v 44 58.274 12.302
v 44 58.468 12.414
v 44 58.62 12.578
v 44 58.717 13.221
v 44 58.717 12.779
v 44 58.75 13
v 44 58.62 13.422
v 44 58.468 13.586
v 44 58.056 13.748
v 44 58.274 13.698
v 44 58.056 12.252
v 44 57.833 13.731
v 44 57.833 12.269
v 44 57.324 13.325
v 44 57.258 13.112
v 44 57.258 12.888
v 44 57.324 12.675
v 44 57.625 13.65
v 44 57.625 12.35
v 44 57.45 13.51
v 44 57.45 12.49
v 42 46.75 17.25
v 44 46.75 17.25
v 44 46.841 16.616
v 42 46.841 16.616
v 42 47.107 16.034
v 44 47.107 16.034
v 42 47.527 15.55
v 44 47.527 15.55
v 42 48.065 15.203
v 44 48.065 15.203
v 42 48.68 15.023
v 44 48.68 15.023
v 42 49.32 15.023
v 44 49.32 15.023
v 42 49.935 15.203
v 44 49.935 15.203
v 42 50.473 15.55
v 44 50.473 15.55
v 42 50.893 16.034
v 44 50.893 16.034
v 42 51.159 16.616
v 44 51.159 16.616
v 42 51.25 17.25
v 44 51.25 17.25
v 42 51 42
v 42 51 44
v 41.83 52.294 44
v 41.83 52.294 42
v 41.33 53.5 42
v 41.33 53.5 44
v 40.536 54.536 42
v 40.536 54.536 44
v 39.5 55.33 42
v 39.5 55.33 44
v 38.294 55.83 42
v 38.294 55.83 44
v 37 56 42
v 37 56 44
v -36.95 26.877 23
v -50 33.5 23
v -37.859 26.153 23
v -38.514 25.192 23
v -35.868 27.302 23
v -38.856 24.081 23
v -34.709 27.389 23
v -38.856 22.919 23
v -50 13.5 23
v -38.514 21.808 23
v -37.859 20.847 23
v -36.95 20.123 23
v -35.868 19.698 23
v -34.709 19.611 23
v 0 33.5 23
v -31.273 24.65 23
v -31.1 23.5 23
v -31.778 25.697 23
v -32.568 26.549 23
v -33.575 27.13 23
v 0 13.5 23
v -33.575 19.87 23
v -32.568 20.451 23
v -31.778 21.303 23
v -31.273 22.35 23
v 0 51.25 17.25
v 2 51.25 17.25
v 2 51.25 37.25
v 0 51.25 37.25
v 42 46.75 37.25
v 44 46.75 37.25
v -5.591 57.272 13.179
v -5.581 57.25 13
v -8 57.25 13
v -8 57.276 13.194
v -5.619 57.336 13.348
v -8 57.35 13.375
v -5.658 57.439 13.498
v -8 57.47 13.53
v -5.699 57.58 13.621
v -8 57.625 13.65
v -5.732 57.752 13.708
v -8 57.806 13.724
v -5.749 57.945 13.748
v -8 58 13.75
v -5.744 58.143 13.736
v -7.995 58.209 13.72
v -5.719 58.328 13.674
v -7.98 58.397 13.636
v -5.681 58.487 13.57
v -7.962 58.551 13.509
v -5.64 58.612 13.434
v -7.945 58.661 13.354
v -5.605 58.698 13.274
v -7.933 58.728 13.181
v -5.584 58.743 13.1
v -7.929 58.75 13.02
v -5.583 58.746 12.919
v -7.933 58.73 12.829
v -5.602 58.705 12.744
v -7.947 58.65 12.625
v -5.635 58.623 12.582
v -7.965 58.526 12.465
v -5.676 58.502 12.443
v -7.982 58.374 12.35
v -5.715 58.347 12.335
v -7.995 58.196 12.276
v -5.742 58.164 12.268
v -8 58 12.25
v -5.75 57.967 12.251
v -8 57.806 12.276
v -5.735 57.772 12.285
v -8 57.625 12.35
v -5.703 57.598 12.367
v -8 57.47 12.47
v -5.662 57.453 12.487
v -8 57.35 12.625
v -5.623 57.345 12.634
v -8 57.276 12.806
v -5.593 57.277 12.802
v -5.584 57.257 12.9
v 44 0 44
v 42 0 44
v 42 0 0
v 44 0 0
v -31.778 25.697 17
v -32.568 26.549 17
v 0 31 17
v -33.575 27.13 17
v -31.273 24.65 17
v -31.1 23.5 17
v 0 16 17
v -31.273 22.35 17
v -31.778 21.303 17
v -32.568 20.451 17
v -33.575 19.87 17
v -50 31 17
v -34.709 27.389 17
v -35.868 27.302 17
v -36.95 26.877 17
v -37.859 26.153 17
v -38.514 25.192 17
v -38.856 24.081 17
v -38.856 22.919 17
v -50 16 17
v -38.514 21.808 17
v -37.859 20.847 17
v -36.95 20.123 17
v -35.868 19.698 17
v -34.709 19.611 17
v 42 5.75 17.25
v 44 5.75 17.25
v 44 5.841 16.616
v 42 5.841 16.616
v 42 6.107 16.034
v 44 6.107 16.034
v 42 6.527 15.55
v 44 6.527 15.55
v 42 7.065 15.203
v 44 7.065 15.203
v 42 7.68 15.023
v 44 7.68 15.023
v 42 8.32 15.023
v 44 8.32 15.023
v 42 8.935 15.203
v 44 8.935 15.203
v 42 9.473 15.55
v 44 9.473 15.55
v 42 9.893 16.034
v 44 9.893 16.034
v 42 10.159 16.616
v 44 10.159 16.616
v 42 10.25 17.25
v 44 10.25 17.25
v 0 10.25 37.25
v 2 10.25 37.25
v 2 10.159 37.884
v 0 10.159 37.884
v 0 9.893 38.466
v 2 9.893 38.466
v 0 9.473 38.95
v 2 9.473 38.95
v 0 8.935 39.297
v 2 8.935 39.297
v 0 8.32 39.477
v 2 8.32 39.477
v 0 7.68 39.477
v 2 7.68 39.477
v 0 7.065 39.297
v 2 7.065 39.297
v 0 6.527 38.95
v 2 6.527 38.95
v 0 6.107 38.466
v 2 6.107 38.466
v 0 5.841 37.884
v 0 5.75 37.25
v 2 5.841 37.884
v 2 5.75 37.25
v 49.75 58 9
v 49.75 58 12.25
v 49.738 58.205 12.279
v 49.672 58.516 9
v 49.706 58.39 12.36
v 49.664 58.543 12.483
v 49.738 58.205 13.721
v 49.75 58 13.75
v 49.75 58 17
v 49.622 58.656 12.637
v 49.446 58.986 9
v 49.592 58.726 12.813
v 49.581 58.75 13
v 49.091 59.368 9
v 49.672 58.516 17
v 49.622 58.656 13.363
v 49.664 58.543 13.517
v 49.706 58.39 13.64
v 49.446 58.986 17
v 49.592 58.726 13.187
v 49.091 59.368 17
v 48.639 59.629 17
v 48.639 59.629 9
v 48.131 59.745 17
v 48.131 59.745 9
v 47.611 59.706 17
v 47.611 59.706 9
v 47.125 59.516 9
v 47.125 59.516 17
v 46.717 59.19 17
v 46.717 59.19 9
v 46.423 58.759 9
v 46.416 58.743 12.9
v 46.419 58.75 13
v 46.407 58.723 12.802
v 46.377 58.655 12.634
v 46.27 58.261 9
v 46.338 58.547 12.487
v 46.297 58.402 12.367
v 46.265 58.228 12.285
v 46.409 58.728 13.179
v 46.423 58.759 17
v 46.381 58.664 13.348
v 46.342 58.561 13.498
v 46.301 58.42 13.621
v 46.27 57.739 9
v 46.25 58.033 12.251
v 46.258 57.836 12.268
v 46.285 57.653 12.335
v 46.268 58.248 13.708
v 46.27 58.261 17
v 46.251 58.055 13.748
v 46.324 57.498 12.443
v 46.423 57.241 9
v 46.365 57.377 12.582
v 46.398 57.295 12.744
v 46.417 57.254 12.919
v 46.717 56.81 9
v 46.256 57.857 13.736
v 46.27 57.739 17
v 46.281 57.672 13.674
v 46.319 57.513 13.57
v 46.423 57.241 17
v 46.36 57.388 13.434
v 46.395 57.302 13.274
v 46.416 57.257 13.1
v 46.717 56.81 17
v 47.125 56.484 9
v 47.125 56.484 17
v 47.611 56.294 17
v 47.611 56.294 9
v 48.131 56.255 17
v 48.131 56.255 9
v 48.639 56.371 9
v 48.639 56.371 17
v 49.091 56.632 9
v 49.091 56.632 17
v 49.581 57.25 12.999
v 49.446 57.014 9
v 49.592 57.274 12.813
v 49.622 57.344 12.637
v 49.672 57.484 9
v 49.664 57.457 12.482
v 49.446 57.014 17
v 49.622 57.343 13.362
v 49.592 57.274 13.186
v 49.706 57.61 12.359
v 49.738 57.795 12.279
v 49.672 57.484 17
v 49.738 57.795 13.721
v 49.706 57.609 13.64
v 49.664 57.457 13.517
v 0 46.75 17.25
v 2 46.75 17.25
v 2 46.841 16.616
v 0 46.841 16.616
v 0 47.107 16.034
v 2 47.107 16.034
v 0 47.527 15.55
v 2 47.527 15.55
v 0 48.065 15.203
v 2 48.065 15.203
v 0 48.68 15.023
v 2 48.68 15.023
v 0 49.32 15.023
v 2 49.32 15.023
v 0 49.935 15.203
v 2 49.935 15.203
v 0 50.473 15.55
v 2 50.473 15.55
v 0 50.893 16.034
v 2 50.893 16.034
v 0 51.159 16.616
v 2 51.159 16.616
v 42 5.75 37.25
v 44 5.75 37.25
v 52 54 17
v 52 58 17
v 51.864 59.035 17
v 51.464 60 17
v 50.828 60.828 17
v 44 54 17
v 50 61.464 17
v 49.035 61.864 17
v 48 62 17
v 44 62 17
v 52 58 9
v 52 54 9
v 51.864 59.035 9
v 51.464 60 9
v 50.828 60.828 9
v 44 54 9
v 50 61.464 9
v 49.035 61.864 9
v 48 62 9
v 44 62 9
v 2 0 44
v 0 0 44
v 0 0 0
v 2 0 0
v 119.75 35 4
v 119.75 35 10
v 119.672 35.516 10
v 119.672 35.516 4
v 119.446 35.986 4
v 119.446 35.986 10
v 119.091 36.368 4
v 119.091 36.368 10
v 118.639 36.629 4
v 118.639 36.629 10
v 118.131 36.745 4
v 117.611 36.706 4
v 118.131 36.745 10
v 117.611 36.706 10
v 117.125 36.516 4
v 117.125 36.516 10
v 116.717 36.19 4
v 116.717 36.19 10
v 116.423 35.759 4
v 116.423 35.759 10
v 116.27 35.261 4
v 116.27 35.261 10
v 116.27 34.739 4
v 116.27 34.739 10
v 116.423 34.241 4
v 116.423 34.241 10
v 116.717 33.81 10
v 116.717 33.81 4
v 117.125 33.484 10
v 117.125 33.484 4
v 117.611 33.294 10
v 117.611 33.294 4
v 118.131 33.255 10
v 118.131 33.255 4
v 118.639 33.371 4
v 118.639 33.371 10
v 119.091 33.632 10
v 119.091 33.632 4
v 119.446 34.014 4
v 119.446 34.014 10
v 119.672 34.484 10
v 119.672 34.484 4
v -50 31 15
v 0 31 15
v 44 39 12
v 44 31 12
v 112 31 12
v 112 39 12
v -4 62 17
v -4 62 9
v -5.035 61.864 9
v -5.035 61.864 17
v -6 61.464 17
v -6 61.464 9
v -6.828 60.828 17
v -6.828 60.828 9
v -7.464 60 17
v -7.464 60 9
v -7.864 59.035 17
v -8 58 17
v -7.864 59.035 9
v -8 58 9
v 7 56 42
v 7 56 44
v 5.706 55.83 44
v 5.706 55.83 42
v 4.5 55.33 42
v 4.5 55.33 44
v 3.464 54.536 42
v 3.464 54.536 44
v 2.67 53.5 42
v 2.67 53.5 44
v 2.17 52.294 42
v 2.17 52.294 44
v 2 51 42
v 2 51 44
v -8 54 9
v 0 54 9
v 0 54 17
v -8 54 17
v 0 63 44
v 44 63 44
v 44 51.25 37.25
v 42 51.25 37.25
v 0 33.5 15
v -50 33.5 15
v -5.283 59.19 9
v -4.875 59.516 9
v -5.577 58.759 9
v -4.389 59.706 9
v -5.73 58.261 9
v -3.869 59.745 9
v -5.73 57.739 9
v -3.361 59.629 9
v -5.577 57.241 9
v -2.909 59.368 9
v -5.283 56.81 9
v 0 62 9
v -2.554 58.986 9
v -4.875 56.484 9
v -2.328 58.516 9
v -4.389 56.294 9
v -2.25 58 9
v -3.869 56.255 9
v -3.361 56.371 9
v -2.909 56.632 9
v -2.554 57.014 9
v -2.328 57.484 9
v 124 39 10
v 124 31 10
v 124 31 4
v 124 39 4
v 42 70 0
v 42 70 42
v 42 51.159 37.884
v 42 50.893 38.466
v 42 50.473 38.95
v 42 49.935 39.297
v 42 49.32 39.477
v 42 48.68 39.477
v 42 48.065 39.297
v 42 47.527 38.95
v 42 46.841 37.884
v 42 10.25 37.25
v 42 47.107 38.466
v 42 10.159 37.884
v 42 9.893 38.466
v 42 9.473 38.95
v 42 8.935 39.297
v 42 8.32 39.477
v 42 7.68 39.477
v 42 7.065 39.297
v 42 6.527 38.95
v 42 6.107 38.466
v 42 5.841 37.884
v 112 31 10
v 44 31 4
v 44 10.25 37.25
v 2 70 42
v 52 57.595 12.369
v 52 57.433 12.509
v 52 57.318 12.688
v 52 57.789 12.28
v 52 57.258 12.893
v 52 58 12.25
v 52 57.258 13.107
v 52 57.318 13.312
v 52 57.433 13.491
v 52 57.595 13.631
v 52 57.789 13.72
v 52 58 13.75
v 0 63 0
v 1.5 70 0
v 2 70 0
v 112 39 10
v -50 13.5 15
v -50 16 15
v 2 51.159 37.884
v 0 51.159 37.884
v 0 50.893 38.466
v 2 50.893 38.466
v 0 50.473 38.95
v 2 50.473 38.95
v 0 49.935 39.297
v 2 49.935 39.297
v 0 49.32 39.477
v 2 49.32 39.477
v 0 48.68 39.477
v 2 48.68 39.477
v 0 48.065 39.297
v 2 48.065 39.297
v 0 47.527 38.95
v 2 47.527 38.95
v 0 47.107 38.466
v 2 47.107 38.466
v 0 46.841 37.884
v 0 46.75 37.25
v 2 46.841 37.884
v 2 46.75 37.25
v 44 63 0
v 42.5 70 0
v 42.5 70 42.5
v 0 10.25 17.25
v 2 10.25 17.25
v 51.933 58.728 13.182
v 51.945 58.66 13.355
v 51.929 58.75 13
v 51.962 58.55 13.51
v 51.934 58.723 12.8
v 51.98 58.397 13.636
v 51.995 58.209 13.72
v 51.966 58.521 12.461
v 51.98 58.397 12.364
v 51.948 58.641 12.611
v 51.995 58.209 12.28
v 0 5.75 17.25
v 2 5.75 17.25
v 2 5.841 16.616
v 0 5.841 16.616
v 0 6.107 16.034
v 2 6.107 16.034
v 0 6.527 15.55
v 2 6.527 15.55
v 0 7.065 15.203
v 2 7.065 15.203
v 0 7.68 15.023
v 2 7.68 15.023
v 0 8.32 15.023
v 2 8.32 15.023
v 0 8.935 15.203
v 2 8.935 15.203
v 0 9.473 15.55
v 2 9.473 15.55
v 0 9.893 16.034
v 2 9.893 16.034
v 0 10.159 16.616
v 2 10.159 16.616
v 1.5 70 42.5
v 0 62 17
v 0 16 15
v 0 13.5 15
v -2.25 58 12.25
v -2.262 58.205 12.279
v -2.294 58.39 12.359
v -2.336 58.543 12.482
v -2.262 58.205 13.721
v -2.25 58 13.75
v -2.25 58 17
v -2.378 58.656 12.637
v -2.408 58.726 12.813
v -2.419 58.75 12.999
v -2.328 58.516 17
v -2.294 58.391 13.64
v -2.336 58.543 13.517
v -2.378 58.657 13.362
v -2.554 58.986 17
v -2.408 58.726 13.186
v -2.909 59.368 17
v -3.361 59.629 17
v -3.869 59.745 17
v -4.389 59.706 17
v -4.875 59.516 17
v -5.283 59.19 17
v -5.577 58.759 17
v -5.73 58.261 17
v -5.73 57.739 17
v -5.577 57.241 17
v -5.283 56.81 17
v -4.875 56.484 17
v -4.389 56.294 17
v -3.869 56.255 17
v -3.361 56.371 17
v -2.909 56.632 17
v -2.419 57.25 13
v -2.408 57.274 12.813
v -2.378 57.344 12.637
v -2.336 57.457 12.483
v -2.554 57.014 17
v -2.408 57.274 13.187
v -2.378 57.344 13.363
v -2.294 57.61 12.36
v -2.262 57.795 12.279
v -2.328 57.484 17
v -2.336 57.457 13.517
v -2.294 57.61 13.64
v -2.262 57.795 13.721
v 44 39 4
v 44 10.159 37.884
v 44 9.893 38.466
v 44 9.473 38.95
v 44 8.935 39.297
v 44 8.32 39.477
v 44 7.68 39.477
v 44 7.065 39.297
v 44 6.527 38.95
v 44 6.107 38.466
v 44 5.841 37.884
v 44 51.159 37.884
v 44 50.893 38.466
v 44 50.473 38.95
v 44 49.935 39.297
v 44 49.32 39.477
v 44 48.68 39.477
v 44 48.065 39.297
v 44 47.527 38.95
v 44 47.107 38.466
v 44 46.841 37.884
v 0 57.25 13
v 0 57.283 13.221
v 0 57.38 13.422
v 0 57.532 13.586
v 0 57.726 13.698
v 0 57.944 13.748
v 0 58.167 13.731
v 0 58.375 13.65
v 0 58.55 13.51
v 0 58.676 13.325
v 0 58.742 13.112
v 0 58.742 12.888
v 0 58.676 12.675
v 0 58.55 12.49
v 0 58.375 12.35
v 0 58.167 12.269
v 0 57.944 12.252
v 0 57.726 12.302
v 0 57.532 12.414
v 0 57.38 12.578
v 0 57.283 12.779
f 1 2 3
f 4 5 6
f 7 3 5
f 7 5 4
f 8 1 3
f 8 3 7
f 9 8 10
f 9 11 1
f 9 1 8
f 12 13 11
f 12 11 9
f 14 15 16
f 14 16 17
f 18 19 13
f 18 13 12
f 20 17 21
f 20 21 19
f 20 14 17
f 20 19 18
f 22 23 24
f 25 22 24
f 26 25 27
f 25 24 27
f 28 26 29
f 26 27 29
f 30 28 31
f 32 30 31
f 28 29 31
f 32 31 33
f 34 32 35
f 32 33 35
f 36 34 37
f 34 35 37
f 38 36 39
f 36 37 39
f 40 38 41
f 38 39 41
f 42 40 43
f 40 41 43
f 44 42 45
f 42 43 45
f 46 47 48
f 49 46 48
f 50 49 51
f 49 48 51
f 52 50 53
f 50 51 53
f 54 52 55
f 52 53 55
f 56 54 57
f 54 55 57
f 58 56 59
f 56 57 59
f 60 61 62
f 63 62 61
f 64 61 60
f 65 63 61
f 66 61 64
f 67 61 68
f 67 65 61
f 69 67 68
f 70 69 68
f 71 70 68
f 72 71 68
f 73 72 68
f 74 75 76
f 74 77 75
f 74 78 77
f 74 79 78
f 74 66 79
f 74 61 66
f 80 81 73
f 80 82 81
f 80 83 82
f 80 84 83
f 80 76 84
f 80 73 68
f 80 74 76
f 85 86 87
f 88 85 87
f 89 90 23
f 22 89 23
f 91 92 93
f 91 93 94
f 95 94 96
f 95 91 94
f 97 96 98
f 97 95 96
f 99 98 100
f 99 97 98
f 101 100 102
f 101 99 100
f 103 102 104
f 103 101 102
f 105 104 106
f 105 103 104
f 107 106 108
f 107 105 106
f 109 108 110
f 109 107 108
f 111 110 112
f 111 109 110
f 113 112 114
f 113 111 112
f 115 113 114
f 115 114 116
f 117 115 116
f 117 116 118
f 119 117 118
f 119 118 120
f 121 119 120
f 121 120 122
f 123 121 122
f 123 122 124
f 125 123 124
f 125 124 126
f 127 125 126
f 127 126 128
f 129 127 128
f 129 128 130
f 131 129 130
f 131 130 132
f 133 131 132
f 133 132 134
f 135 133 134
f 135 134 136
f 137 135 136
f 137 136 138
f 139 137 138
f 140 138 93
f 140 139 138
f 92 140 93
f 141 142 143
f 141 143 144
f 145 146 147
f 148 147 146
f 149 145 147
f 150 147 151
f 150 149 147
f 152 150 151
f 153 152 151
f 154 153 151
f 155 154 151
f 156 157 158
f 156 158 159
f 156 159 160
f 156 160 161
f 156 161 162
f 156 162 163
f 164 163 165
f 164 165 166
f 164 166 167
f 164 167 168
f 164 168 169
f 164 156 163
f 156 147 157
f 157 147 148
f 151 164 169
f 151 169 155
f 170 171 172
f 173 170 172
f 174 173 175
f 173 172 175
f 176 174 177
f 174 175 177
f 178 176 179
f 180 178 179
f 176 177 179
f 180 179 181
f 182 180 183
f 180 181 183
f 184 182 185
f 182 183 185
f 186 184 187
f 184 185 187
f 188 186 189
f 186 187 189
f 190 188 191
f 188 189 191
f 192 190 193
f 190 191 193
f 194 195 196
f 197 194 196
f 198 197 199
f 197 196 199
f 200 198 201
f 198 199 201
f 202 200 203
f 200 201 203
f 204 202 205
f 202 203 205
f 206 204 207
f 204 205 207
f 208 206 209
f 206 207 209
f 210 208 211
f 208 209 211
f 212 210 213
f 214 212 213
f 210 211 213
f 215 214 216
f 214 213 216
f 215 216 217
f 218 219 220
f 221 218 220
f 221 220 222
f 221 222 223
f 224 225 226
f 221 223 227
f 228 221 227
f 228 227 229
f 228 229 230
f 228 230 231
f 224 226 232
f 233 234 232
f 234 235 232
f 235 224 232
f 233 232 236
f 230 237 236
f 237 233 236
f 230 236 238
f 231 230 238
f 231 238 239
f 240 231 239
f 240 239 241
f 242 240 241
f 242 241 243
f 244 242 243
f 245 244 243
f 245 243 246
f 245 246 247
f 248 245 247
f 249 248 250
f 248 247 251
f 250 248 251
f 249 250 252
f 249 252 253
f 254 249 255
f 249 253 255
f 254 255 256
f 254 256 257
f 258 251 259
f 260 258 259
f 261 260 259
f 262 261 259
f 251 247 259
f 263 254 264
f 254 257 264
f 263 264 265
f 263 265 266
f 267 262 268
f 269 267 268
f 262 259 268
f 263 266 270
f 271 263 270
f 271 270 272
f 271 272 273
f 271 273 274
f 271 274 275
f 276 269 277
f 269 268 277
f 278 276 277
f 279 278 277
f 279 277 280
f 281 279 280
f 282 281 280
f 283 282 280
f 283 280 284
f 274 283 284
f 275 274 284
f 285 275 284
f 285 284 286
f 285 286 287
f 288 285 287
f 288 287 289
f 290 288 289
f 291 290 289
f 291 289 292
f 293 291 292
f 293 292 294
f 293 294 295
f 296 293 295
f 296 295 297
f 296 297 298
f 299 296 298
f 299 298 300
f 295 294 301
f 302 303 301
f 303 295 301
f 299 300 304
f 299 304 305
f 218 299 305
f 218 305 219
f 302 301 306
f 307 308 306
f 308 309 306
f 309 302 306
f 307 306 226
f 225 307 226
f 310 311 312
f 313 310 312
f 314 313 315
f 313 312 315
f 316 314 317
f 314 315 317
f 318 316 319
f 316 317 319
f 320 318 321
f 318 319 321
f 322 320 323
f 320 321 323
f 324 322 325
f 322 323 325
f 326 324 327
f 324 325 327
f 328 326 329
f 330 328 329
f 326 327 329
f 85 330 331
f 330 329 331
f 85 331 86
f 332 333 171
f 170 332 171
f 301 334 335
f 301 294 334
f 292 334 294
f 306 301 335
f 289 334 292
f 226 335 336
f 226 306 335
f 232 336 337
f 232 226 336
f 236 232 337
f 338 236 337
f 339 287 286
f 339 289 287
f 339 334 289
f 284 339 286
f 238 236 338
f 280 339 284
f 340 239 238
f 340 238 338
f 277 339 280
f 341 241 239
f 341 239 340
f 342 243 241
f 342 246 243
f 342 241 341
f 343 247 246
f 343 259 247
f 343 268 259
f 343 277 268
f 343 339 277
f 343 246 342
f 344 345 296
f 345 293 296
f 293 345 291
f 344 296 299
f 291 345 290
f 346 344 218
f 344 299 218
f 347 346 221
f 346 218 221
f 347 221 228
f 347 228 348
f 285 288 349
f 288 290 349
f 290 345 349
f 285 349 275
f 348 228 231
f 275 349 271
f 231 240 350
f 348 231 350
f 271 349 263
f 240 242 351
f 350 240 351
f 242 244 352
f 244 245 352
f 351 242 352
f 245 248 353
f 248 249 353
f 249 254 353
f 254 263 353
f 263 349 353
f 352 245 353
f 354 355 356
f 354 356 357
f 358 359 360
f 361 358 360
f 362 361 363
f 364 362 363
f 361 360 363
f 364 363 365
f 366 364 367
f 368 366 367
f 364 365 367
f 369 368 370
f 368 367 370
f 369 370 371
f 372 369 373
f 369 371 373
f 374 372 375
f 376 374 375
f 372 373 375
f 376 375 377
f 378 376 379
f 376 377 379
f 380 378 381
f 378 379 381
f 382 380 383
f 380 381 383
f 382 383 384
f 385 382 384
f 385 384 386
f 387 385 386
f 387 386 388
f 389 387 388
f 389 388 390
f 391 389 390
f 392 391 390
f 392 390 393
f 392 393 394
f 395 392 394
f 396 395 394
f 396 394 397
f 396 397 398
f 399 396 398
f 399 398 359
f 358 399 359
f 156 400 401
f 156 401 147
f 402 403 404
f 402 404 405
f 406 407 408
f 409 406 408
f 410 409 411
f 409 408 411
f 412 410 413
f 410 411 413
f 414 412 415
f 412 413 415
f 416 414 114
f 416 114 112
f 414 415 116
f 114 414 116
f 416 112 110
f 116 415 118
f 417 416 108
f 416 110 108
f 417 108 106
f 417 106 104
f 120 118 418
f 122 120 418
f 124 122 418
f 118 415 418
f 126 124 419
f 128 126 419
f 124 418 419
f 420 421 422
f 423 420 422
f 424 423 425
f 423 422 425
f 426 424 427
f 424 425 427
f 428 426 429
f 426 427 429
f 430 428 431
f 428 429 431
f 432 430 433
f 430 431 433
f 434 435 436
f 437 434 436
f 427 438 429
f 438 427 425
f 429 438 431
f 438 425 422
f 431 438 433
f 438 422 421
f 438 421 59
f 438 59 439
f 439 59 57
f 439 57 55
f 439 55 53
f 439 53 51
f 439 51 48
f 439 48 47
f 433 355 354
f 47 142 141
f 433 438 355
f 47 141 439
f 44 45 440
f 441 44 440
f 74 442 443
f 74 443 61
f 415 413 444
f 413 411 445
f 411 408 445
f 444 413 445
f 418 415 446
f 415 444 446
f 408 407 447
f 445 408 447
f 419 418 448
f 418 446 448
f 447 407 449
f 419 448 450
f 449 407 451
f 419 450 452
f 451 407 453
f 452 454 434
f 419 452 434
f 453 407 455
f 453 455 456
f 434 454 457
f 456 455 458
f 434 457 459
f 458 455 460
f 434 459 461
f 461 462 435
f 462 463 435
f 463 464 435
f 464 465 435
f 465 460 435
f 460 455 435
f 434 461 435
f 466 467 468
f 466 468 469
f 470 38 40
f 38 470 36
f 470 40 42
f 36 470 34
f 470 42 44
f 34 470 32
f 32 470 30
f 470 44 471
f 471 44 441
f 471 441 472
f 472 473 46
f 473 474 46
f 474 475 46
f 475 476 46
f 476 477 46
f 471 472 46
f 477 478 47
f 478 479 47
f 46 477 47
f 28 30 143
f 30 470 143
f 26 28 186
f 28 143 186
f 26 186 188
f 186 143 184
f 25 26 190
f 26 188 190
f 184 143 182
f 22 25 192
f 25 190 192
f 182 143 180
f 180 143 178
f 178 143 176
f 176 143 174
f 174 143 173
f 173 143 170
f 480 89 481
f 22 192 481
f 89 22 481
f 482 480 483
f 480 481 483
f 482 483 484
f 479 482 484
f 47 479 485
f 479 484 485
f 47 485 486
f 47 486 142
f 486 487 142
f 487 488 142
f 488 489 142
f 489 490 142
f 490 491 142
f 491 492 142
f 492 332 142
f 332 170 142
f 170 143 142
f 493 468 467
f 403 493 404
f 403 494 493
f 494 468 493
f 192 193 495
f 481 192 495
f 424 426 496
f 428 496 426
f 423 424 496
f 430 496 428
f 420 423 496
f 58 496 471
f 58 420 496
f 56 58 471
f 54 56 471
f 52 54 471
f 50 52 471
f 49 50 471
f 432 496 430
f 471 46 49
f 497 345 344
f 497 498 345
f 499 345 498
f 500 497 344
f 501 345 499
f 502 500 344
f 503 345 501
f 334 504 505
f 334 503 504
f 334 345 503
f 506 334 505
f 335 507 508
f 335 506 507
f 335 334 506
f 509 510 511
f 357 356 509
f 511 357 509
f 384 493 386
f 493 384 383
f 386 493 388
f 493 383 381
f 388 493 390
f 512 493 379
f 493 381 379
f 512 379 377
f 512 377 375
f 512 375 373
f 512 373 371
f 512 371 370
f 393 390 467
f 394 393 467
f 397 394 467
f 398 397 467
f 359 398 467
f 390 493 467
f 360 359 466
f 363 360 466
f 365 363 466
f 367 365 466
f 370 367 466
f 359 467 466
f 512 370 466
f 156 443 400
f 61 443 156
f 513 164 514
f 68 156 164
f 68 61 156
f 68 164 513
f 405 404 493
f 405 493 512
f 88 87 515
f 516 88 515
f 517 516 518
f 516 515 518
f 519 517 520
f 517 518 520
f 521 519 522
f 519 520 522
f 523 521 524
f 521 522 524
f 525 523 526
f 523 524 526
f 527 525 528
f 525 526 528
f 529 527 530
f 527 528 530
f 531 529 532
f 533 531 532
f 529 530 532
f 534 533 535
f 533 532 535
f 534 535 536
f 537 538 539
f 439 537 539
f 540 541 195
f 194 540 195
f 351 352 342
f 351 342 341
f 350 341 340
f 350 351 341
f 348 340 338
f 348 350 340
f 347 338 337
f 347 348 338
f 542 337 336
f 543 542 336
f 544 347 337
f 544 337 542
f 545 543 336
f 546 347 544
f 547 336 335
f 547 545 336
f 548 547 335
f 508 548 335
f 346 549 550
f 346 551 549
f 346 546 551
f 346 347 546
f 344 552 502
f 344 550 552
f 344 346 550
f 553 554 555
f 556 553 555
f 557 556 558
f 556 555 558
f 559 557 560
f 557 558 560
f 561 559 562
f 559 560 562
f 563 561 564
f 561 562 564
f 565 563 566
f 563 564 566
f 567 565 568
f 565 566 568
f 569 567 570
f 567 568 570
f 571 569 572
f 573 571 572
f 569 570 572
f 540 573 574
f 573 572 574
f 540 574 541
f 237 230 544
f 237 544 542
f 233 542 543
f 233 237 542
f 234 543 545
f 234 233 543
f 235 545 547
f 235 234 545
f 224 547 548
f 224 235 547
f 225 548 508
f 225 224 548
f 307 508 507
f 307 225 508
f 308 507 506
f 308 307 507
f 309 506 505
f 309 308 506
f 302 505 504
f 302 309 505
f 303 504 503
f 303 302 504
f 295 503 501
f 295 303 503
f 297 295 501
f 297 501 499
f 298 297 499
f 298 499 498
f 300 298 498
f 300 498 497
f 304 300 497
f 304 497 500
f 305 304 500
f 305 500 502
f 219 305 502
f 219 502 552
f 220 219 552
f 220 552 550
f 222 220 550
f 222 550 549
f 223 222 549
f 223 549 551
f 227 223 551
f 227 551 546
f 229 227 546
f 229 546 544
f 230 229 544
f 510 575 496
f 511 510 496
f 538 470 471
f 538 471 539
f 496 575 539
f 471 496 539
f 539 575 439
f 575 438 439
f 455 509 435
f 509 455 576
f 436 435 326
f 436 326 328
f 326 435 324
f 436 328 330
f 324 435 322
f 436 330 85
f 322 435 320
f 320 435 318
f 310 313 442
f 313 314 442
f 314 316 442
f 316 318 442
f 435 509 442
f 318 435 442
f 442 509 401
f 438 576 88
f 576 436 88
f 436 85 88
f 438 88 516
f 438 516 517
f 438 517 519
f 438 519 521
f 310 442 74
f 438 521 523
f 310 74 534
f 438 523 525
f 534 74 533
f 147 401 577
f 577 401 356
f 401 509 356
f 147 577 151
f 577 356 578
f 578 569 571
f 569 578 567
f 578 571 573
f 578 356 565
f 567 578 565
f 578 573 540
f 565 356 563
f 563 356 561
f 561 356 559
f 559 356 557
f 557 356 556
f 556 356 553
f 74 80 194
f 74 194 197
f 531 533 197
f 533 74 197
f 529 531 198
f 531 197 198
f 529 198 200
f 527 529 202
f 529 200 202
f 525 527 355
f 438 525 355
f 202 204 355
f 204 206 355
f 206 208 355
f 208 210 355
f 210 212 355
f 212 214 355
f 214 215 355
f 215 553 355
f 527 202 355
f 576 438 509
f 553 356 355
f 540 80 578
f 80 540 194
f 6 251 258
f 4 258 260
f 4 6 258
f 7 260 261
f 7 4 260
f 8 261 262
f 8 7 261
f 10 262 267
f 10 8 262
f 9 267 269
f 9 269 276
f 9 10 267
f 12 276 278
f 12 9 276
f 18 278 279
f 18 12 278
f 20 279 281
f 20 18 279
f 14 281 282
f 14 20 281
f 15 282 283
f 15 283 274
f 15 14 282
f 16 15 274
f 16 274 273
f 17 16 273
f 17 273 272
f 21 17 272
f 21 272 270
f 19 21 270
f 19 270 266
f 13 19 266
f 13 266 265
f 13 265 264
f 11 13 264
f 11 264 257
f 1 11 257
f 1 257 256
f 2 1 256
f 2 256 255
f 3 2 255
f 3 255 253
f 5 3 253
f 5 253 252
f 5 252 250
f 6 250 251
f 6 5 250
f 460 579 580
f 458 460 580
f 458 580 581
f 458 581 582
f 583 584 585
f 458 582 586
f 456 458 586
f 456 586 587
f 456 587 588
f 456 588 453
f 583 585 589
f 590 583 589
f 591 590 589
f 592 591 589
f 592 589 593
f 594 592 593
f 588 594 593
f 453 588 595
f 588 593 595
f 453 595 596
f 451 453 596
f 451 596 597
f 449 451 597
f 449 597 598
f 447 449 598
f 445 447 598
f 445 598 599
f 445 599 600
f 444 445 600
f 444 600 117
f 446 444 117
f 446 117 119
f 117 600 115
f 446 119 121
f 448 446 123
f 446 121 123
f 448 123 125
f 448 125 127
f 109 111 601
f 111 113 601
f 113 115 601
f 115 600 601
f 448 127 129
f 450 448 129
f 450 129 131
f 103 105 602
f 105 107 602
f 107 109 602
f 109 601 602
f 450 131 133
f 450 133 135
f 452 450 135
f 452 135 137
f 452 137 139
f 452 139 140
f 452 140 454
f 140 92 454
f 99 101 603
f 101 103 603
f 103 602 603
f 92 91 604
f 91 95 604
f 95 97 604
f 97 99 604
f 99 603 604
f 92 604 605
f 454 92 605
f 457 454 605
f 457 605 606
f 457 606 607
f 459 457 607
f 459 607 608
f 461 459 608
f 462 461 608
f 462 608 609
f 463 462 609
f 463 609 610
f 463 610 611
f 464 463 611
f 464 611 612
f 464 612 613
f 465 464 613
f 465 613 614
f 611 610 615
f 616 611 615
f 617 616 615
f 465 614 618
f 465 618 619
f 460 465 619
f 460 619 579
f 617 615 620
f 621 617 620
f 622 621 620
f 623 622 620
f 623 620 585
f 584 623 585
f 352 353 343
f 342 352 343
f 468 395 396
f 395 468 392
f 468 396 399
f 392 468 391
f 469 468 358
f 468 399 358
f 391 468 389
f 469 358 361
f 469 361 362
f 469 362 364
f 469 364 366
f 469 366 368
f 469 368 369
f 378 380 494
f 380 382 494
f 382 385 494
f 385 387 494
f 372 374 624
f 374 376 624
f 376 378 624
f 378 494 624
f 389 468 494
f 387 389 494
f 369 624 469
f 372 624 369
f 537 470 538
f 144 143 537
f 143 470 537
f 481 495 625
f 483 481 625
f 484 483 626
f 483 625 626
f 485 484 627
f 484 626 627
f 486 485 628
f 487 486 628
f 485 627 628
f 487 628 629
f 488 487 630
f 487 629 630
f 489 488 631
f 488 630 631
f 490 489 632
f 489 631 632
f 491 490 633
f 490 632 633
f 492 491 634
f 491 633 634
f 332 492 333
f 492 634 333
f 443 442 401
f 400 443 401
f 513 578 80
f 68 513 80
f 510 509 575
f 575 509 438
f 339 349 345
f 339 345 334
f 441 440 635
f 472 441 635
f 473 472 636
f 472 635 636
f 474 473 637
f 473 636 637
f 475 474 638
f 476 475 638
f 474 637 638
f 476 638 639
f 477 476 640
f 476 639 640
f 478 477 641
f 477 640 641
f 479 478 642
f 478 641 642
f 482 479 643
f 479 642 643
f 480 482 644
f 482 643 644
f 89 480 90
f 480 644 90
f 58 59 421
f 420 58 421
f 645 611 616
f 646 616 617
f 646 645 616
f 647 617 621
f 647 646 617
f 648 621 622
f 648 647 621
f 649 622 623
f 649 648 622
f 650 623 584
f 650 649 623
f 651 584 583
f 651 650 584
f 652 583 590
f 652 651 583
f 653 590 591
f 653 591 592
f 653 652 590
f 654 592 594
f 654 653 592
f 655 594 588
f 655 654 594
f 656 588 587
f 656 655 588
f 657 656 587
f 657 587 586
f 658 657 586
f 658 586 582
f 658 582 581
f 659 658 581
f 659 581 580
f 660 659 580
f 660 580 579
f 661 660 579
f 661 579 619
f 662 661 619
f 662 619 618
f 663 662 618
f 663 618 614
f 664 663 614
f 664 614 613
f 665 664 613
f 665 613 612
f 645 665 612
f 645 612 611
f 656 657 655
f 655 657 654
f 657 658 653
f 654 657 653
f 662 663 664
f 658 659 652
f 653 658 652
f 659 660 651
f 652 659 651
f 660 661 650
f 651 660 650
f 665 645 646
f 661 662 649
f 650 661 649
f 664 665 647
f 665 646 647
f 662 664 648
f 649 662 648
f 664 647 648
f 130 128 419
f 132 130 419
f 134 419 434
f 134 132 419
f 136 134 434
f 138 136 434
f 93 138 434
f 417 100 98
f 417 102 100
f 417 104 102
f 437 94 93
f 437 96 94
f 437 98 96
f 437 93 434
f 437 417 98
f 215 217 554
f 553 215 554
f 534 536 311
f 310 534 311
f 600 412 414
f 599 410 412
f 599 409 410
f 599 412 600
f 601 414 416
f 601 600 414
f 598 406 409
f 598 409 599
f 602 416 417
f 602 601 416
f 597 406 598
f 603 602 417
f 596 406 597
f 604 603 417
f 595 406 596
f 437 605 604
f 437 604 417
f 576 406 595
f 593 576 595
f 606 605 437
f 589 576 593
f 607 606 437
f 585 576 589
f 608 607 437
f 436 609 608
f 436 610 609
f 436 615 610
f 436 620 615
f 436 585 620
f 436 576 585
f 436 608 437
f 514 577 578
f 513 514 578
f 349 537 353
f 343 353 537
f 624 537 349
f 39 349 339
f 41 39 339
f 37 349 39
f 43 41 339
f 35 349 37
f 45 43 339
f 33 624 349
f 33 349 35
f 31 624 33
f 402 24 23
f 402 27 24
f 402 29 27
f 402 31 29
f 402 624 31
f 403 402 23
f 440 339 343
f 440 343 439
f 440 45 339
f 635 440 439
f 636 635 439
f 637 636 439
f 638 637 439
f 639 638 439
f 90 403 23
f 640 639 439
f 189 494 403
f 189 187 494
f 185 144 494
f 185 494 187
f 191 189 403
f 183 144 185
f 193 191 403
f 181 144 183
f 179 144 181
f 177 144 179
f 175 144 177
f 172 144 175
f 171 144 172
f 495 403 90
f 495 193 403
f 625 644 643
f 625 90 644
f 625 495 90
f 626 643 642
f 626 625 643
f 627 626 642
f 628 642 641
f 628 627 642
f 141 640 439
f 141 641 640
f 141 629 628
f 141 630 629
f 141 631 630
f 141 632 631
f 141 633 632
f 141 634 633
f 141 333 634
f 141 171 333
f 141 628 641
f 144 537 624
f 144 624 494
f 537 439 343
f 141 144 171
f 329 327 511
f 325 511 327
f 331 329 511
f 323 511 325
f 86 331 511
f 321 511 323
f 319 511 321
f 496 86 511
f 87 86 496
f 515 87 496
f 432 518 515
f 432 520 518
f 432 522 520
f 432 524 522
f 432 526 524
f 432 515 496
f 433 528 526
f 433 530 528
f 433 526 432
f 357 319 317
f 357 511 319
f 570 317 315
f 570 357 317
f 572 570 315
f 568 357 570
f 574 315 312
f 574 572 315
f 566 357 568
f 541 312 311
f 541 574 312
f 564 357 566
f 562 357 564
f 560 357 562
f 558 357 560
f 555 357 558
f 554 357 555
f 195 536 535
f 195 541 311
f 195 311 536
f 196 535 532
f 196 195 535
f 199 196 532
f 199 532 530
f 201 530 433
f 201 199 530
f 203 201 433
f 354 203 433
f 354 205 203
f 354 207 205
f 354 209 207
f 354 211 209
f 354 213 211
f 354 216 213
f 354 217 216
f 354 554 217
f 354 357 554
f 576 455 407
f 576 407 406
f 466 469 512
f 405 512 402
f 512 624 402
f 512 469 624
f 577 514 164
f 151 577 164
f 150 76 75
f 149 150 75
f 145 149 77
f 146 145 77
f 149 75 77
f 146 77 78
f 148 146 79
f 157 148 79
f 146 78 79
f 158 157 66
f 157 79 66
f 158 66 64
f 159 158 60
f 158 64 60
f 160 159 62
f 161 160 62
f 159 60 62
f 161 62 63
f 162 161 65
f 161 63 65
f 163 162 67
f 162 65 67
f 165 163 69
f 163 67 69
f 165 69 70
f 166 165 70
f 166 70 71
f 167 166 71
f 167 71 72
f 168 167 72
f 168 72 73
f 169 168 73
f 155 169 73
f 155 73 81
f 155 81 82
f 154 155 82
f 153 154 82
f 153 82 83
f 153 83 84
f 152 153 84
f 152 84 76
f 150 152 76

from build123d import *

# Parameters (mm, degrees)
F0_W         = 44
F0_H         = 44
F1_DEPTH     = 70
F2_W         = 40
F2_H         = 42
F3_DEPTH     = 70
F5_DEPTH     = 44
F7_DEPTH     = 2
F9_W         = 8
F9_H         = 8
F10_DEPTH    = 80
F11_W        = 8
F11_H        = 2
F12_DEPTH    = 12
F13_W        = 20
F13_H        = 8
F14_DEPTH    = 50
F15_W        = 15
F15_H        = 2
F16_DEPTH    = 50
F17_R        = 3.9
F18_DEPTH    = 20
F19_SIZE2    = 1.5
F19_SIZE     = 7
F20_SIZE2    = 7
F20_SIZE     = 1.5
F21_SIZE2    = 7
F21_SIZE     = 1.5
F22_R        = 1.75
F23_DEPTH    = 8
F24_DEPTH    = 44
F25_W        = 8
F25_H        = 8
F25_R        = 0.75
F26_DEPTH    = 8
F27_R        = 1.75
F28_DEPTH    = 8
F29_T1_DEPTH = 28
F30_W        = 8
F30_H        = 8
F30_R        = 0.75
F31_DEPTH    = 8
F32_R        = 1.75
F33_DEPTH    = 8
F34_T1_DEPTH = 28


# Not quite as in the source:
# - a fillet or chamfer that OpenCascade refuses, or shapes differently, is made with other operations: its cross-section is extruded or revolved along the edge and cut away or added


with BuildPart() as f1:
    # F0 (on Front) → F1 (new body)
    with BuildSketch(Plane.XZ):
        with Locations((22, 22)):
            Rectangle(F0_W, F0_H)
    extrude(amount=-F1_DEPTH)

    # F2 (on face) → F3 (cut, through all)
    with BuildSketch(Plane.XZ):
        with Locations((22, 21)):
            Rectangle(F2_W, F2_H)
    extrude(amount=-F3_DEPTH, mode=Mode.SUBTRACT)

    # F4 (on face) → F5 (cut)
    with BuildSketch(Plane.YZ.offset(44)):
        with BuildLine():
            ThreePointArc((51.25, 37.25), (49, 39.5), (46.75, 37.25))
            Line((46.75, 37.25), (46.75, 17.25))
            ThreePointArc((46.75, 17.25), (49, 15), (51.25, 17.25))
            Line((51.25, 17.25), (51.25, 37.25))
        make_face()
    extrude(amount=-F5_DEPTH, mode=Mode.SUBTRACT)

    # F6 (on face) → F7 (cut, through all)
    with BuildSketch(Plane.XY.offset(44)):
        with BuildLine():
            Line((2, 51), (2, 0))
            Line((2, 0), (42, 0))
            Line((42, 0), (42, 51))
            ThreePointArc((42, 51), (40.5355339059, 54.5355339059), (37, 56))
            Line((37, 56), (7, 56))
            ThreePointArc((7, 56), (3.4644660941, 54.5355339059), (2, 51))
        make_face()
    extrude(amount=-F7_DEPTH, mode=Mode.SUBTRACT)

    # F9 (on face) → F10 (join)
    with BuildSketch(Plane.YZ.offset(44)):
        with Locations((35, 8)):
            Rectangle(F9_W, F9_H)
    extrude(amount=F10_DEPTH)

    # F11 (on face) → F12 (cut)
    with BuildSketch(Plane.YZ.offset(124)):
        with Locations((35, 11)):
            Rectangle(F11_W, F11_H)
    extrude(amount=-F12_DEPTH, mode=Mode.SUBTRACT)

    # F13 (on face) → F14 (join)
    with BuildSketch(Plane(origin=(0, 0, 0), x_dir=(0, -1, 0), z_dir=(-1, 0, 0))):
        with Locations((-23.5, 19)):
            Rectangle(F13_W, F13_H)
    extrude(amount=F14_DEPTH)

    # F15 (on face) → F16 (cut, through all)
    with BuildSketch(Plane(origin=(-50, 0, 0), x_dir=(0, -1, 0), z_dir=(-1, 0, 0))):
        with Locations((-23.5, 16)):
            Rectangle(F15_W, F15_H)
    extrude(amount=-F16_DEPTH, mode=Mode.SUBTRACT)

    # F17 (on face) → F18 (cut)
    with BuildSketch(Plane.XY.offset(23)):
        with Locations((-35, 23.5)):
            Circle(F17_R)
    extrude(amount=-F18_DEPTH, mode=Mode.SUBTRACT)

    # F19
    f19_edges = [f1.edges().sort_by_distance(p)[0] for p in [
        (44, 70, 22),
    ]]
    f19_side = f1.faces().sort_by_distance((44, 34.490511, 22.116835))[0]
    chamfer(f19_edges, length=F19_SIZE, length2=F19_SIZE2, reference=f19_side)

    # F20
    f20_edges = [f1.edges().sort_by_distance(p)[0] for p in [
        (21.25, 70, 44),
    ]]
    f20_side = f1.faces().sort_by_distance((21.25, 70, 43.388261))[0]
    chamfer(f20_edges, length=F20_SIZE, length2=F20_SIZE2, reference=f20_side)

    # F21
    f21_edges = [f1.edges().sort_by_distance(p)[0] for p in [
        (0, 70, 21.25),
    ]]
    f21_side = f1.faces().sort_by_distance((42.439896, 70, 21.25))[0]
    chamfer(f21_edges, length=F21_SIZE, length2=F21_SIZE2, reference=f21_side)

    # F22 (on face) → F23 (cut)
    with BuildSketch(Plane.XY.offset(10)):
        with Locations((118, 35)):
            Circle(F22_R)
    extrude(amount=-F23_DEPTH, mode=Mode.SUBTRACT)

    # F8 (on face) → F24 (cut)
    with BuildSketch(Plane.YZ.offset(44)):
        with BuildLine():
            ThreePointArc((10.25, 37.25), (8, 39.5), (5.75, 37.25))
            Line((5.75, 37.25), (5.75, 17.25))
            ThreePointArc((5.75, 17.25), (8, 15), (10.25, 17.25))
            Line((10.25, 17.25), (10.25, 37.25))
        make_face()
    extrude(amount=-F24_DEPTH, mode=Mode.SUBTRACT)

    # F25 (on face) → F26 (join)
    with BuildSketch(Plane.YZ.offset(44)):
        with Locations((58, 13)):
            Rectangle(F25_W, F25_H)
        with Locations((58, 13)):
            Circle(F25_R, mode=Mode.SUBTRACT)
    extrude(amount=F26_DEPTH)

    # F27 (on face) → F28 (cut)
    with BuildSketch(Plane.XY.offset(17)):
        with Locations((48, 58)):
            Circle(F27_R)
    extrude(amount=-F28_DEPTH, mode=Mode.SUBTRACT)

    # F29: fillet of radius 4 on 1 edges, made by hand

    # F29_s2 → F29_t1 (cut)
    with BuildSketch(Plane.XY.offset(-1)):
        with BuildLine():
            ThreePointArc((48, 62), (50.8284271247, 60.8284271247), (52, 58))
            Line((52, 58), (52, 62))
            Line((52, 62), (48, 62))
        make_face()
    extrude(amount=F29_T1_DEPTH, mode=Mode.SUBTRACT)

    # F30 (on face) → F31 (join)
    with BuildSketch(Plane(origin=(0, 0, 0), x_dir=(0, -1, 0), z_dir=(-1, 0, 0))):
        with Locations((-58, 13)):
            Rectangle(F30_W, F30_H)
        with Locations((-58, 13)):
            Circle(F30_R, mode=Mode.SUBTRACT)
    extrude(amount=F31_DEPTH)

    # F32 (on face) → F33 (cut)
    with BuildSketch(Plane.XY.offset(17)):
        with Locations((-4, 58)):
            Circle(F32_R)
    extrude(amount=-F33_DEPTH, mode=Mode.SUBTRACT)

    # F34: fillet of radius 4 on 1 edges, made by hand

    # F34_s2 → F34_t1 (cut)
    with BuildSketch(Plane.XY.offset(-1)):
        with BuildLine():
            ThreePointArc((-4, 62), (-6.8284271247, 60.8284271247), (-8, 58))
            Line((-8, 58), (-8, 62))
            Line((-8, 62), (-4, 62))
        make_face()
    extrude(amount=F34_T1_DEPTH, mode=Mode.SUBTRACT)


solid = f1.part
